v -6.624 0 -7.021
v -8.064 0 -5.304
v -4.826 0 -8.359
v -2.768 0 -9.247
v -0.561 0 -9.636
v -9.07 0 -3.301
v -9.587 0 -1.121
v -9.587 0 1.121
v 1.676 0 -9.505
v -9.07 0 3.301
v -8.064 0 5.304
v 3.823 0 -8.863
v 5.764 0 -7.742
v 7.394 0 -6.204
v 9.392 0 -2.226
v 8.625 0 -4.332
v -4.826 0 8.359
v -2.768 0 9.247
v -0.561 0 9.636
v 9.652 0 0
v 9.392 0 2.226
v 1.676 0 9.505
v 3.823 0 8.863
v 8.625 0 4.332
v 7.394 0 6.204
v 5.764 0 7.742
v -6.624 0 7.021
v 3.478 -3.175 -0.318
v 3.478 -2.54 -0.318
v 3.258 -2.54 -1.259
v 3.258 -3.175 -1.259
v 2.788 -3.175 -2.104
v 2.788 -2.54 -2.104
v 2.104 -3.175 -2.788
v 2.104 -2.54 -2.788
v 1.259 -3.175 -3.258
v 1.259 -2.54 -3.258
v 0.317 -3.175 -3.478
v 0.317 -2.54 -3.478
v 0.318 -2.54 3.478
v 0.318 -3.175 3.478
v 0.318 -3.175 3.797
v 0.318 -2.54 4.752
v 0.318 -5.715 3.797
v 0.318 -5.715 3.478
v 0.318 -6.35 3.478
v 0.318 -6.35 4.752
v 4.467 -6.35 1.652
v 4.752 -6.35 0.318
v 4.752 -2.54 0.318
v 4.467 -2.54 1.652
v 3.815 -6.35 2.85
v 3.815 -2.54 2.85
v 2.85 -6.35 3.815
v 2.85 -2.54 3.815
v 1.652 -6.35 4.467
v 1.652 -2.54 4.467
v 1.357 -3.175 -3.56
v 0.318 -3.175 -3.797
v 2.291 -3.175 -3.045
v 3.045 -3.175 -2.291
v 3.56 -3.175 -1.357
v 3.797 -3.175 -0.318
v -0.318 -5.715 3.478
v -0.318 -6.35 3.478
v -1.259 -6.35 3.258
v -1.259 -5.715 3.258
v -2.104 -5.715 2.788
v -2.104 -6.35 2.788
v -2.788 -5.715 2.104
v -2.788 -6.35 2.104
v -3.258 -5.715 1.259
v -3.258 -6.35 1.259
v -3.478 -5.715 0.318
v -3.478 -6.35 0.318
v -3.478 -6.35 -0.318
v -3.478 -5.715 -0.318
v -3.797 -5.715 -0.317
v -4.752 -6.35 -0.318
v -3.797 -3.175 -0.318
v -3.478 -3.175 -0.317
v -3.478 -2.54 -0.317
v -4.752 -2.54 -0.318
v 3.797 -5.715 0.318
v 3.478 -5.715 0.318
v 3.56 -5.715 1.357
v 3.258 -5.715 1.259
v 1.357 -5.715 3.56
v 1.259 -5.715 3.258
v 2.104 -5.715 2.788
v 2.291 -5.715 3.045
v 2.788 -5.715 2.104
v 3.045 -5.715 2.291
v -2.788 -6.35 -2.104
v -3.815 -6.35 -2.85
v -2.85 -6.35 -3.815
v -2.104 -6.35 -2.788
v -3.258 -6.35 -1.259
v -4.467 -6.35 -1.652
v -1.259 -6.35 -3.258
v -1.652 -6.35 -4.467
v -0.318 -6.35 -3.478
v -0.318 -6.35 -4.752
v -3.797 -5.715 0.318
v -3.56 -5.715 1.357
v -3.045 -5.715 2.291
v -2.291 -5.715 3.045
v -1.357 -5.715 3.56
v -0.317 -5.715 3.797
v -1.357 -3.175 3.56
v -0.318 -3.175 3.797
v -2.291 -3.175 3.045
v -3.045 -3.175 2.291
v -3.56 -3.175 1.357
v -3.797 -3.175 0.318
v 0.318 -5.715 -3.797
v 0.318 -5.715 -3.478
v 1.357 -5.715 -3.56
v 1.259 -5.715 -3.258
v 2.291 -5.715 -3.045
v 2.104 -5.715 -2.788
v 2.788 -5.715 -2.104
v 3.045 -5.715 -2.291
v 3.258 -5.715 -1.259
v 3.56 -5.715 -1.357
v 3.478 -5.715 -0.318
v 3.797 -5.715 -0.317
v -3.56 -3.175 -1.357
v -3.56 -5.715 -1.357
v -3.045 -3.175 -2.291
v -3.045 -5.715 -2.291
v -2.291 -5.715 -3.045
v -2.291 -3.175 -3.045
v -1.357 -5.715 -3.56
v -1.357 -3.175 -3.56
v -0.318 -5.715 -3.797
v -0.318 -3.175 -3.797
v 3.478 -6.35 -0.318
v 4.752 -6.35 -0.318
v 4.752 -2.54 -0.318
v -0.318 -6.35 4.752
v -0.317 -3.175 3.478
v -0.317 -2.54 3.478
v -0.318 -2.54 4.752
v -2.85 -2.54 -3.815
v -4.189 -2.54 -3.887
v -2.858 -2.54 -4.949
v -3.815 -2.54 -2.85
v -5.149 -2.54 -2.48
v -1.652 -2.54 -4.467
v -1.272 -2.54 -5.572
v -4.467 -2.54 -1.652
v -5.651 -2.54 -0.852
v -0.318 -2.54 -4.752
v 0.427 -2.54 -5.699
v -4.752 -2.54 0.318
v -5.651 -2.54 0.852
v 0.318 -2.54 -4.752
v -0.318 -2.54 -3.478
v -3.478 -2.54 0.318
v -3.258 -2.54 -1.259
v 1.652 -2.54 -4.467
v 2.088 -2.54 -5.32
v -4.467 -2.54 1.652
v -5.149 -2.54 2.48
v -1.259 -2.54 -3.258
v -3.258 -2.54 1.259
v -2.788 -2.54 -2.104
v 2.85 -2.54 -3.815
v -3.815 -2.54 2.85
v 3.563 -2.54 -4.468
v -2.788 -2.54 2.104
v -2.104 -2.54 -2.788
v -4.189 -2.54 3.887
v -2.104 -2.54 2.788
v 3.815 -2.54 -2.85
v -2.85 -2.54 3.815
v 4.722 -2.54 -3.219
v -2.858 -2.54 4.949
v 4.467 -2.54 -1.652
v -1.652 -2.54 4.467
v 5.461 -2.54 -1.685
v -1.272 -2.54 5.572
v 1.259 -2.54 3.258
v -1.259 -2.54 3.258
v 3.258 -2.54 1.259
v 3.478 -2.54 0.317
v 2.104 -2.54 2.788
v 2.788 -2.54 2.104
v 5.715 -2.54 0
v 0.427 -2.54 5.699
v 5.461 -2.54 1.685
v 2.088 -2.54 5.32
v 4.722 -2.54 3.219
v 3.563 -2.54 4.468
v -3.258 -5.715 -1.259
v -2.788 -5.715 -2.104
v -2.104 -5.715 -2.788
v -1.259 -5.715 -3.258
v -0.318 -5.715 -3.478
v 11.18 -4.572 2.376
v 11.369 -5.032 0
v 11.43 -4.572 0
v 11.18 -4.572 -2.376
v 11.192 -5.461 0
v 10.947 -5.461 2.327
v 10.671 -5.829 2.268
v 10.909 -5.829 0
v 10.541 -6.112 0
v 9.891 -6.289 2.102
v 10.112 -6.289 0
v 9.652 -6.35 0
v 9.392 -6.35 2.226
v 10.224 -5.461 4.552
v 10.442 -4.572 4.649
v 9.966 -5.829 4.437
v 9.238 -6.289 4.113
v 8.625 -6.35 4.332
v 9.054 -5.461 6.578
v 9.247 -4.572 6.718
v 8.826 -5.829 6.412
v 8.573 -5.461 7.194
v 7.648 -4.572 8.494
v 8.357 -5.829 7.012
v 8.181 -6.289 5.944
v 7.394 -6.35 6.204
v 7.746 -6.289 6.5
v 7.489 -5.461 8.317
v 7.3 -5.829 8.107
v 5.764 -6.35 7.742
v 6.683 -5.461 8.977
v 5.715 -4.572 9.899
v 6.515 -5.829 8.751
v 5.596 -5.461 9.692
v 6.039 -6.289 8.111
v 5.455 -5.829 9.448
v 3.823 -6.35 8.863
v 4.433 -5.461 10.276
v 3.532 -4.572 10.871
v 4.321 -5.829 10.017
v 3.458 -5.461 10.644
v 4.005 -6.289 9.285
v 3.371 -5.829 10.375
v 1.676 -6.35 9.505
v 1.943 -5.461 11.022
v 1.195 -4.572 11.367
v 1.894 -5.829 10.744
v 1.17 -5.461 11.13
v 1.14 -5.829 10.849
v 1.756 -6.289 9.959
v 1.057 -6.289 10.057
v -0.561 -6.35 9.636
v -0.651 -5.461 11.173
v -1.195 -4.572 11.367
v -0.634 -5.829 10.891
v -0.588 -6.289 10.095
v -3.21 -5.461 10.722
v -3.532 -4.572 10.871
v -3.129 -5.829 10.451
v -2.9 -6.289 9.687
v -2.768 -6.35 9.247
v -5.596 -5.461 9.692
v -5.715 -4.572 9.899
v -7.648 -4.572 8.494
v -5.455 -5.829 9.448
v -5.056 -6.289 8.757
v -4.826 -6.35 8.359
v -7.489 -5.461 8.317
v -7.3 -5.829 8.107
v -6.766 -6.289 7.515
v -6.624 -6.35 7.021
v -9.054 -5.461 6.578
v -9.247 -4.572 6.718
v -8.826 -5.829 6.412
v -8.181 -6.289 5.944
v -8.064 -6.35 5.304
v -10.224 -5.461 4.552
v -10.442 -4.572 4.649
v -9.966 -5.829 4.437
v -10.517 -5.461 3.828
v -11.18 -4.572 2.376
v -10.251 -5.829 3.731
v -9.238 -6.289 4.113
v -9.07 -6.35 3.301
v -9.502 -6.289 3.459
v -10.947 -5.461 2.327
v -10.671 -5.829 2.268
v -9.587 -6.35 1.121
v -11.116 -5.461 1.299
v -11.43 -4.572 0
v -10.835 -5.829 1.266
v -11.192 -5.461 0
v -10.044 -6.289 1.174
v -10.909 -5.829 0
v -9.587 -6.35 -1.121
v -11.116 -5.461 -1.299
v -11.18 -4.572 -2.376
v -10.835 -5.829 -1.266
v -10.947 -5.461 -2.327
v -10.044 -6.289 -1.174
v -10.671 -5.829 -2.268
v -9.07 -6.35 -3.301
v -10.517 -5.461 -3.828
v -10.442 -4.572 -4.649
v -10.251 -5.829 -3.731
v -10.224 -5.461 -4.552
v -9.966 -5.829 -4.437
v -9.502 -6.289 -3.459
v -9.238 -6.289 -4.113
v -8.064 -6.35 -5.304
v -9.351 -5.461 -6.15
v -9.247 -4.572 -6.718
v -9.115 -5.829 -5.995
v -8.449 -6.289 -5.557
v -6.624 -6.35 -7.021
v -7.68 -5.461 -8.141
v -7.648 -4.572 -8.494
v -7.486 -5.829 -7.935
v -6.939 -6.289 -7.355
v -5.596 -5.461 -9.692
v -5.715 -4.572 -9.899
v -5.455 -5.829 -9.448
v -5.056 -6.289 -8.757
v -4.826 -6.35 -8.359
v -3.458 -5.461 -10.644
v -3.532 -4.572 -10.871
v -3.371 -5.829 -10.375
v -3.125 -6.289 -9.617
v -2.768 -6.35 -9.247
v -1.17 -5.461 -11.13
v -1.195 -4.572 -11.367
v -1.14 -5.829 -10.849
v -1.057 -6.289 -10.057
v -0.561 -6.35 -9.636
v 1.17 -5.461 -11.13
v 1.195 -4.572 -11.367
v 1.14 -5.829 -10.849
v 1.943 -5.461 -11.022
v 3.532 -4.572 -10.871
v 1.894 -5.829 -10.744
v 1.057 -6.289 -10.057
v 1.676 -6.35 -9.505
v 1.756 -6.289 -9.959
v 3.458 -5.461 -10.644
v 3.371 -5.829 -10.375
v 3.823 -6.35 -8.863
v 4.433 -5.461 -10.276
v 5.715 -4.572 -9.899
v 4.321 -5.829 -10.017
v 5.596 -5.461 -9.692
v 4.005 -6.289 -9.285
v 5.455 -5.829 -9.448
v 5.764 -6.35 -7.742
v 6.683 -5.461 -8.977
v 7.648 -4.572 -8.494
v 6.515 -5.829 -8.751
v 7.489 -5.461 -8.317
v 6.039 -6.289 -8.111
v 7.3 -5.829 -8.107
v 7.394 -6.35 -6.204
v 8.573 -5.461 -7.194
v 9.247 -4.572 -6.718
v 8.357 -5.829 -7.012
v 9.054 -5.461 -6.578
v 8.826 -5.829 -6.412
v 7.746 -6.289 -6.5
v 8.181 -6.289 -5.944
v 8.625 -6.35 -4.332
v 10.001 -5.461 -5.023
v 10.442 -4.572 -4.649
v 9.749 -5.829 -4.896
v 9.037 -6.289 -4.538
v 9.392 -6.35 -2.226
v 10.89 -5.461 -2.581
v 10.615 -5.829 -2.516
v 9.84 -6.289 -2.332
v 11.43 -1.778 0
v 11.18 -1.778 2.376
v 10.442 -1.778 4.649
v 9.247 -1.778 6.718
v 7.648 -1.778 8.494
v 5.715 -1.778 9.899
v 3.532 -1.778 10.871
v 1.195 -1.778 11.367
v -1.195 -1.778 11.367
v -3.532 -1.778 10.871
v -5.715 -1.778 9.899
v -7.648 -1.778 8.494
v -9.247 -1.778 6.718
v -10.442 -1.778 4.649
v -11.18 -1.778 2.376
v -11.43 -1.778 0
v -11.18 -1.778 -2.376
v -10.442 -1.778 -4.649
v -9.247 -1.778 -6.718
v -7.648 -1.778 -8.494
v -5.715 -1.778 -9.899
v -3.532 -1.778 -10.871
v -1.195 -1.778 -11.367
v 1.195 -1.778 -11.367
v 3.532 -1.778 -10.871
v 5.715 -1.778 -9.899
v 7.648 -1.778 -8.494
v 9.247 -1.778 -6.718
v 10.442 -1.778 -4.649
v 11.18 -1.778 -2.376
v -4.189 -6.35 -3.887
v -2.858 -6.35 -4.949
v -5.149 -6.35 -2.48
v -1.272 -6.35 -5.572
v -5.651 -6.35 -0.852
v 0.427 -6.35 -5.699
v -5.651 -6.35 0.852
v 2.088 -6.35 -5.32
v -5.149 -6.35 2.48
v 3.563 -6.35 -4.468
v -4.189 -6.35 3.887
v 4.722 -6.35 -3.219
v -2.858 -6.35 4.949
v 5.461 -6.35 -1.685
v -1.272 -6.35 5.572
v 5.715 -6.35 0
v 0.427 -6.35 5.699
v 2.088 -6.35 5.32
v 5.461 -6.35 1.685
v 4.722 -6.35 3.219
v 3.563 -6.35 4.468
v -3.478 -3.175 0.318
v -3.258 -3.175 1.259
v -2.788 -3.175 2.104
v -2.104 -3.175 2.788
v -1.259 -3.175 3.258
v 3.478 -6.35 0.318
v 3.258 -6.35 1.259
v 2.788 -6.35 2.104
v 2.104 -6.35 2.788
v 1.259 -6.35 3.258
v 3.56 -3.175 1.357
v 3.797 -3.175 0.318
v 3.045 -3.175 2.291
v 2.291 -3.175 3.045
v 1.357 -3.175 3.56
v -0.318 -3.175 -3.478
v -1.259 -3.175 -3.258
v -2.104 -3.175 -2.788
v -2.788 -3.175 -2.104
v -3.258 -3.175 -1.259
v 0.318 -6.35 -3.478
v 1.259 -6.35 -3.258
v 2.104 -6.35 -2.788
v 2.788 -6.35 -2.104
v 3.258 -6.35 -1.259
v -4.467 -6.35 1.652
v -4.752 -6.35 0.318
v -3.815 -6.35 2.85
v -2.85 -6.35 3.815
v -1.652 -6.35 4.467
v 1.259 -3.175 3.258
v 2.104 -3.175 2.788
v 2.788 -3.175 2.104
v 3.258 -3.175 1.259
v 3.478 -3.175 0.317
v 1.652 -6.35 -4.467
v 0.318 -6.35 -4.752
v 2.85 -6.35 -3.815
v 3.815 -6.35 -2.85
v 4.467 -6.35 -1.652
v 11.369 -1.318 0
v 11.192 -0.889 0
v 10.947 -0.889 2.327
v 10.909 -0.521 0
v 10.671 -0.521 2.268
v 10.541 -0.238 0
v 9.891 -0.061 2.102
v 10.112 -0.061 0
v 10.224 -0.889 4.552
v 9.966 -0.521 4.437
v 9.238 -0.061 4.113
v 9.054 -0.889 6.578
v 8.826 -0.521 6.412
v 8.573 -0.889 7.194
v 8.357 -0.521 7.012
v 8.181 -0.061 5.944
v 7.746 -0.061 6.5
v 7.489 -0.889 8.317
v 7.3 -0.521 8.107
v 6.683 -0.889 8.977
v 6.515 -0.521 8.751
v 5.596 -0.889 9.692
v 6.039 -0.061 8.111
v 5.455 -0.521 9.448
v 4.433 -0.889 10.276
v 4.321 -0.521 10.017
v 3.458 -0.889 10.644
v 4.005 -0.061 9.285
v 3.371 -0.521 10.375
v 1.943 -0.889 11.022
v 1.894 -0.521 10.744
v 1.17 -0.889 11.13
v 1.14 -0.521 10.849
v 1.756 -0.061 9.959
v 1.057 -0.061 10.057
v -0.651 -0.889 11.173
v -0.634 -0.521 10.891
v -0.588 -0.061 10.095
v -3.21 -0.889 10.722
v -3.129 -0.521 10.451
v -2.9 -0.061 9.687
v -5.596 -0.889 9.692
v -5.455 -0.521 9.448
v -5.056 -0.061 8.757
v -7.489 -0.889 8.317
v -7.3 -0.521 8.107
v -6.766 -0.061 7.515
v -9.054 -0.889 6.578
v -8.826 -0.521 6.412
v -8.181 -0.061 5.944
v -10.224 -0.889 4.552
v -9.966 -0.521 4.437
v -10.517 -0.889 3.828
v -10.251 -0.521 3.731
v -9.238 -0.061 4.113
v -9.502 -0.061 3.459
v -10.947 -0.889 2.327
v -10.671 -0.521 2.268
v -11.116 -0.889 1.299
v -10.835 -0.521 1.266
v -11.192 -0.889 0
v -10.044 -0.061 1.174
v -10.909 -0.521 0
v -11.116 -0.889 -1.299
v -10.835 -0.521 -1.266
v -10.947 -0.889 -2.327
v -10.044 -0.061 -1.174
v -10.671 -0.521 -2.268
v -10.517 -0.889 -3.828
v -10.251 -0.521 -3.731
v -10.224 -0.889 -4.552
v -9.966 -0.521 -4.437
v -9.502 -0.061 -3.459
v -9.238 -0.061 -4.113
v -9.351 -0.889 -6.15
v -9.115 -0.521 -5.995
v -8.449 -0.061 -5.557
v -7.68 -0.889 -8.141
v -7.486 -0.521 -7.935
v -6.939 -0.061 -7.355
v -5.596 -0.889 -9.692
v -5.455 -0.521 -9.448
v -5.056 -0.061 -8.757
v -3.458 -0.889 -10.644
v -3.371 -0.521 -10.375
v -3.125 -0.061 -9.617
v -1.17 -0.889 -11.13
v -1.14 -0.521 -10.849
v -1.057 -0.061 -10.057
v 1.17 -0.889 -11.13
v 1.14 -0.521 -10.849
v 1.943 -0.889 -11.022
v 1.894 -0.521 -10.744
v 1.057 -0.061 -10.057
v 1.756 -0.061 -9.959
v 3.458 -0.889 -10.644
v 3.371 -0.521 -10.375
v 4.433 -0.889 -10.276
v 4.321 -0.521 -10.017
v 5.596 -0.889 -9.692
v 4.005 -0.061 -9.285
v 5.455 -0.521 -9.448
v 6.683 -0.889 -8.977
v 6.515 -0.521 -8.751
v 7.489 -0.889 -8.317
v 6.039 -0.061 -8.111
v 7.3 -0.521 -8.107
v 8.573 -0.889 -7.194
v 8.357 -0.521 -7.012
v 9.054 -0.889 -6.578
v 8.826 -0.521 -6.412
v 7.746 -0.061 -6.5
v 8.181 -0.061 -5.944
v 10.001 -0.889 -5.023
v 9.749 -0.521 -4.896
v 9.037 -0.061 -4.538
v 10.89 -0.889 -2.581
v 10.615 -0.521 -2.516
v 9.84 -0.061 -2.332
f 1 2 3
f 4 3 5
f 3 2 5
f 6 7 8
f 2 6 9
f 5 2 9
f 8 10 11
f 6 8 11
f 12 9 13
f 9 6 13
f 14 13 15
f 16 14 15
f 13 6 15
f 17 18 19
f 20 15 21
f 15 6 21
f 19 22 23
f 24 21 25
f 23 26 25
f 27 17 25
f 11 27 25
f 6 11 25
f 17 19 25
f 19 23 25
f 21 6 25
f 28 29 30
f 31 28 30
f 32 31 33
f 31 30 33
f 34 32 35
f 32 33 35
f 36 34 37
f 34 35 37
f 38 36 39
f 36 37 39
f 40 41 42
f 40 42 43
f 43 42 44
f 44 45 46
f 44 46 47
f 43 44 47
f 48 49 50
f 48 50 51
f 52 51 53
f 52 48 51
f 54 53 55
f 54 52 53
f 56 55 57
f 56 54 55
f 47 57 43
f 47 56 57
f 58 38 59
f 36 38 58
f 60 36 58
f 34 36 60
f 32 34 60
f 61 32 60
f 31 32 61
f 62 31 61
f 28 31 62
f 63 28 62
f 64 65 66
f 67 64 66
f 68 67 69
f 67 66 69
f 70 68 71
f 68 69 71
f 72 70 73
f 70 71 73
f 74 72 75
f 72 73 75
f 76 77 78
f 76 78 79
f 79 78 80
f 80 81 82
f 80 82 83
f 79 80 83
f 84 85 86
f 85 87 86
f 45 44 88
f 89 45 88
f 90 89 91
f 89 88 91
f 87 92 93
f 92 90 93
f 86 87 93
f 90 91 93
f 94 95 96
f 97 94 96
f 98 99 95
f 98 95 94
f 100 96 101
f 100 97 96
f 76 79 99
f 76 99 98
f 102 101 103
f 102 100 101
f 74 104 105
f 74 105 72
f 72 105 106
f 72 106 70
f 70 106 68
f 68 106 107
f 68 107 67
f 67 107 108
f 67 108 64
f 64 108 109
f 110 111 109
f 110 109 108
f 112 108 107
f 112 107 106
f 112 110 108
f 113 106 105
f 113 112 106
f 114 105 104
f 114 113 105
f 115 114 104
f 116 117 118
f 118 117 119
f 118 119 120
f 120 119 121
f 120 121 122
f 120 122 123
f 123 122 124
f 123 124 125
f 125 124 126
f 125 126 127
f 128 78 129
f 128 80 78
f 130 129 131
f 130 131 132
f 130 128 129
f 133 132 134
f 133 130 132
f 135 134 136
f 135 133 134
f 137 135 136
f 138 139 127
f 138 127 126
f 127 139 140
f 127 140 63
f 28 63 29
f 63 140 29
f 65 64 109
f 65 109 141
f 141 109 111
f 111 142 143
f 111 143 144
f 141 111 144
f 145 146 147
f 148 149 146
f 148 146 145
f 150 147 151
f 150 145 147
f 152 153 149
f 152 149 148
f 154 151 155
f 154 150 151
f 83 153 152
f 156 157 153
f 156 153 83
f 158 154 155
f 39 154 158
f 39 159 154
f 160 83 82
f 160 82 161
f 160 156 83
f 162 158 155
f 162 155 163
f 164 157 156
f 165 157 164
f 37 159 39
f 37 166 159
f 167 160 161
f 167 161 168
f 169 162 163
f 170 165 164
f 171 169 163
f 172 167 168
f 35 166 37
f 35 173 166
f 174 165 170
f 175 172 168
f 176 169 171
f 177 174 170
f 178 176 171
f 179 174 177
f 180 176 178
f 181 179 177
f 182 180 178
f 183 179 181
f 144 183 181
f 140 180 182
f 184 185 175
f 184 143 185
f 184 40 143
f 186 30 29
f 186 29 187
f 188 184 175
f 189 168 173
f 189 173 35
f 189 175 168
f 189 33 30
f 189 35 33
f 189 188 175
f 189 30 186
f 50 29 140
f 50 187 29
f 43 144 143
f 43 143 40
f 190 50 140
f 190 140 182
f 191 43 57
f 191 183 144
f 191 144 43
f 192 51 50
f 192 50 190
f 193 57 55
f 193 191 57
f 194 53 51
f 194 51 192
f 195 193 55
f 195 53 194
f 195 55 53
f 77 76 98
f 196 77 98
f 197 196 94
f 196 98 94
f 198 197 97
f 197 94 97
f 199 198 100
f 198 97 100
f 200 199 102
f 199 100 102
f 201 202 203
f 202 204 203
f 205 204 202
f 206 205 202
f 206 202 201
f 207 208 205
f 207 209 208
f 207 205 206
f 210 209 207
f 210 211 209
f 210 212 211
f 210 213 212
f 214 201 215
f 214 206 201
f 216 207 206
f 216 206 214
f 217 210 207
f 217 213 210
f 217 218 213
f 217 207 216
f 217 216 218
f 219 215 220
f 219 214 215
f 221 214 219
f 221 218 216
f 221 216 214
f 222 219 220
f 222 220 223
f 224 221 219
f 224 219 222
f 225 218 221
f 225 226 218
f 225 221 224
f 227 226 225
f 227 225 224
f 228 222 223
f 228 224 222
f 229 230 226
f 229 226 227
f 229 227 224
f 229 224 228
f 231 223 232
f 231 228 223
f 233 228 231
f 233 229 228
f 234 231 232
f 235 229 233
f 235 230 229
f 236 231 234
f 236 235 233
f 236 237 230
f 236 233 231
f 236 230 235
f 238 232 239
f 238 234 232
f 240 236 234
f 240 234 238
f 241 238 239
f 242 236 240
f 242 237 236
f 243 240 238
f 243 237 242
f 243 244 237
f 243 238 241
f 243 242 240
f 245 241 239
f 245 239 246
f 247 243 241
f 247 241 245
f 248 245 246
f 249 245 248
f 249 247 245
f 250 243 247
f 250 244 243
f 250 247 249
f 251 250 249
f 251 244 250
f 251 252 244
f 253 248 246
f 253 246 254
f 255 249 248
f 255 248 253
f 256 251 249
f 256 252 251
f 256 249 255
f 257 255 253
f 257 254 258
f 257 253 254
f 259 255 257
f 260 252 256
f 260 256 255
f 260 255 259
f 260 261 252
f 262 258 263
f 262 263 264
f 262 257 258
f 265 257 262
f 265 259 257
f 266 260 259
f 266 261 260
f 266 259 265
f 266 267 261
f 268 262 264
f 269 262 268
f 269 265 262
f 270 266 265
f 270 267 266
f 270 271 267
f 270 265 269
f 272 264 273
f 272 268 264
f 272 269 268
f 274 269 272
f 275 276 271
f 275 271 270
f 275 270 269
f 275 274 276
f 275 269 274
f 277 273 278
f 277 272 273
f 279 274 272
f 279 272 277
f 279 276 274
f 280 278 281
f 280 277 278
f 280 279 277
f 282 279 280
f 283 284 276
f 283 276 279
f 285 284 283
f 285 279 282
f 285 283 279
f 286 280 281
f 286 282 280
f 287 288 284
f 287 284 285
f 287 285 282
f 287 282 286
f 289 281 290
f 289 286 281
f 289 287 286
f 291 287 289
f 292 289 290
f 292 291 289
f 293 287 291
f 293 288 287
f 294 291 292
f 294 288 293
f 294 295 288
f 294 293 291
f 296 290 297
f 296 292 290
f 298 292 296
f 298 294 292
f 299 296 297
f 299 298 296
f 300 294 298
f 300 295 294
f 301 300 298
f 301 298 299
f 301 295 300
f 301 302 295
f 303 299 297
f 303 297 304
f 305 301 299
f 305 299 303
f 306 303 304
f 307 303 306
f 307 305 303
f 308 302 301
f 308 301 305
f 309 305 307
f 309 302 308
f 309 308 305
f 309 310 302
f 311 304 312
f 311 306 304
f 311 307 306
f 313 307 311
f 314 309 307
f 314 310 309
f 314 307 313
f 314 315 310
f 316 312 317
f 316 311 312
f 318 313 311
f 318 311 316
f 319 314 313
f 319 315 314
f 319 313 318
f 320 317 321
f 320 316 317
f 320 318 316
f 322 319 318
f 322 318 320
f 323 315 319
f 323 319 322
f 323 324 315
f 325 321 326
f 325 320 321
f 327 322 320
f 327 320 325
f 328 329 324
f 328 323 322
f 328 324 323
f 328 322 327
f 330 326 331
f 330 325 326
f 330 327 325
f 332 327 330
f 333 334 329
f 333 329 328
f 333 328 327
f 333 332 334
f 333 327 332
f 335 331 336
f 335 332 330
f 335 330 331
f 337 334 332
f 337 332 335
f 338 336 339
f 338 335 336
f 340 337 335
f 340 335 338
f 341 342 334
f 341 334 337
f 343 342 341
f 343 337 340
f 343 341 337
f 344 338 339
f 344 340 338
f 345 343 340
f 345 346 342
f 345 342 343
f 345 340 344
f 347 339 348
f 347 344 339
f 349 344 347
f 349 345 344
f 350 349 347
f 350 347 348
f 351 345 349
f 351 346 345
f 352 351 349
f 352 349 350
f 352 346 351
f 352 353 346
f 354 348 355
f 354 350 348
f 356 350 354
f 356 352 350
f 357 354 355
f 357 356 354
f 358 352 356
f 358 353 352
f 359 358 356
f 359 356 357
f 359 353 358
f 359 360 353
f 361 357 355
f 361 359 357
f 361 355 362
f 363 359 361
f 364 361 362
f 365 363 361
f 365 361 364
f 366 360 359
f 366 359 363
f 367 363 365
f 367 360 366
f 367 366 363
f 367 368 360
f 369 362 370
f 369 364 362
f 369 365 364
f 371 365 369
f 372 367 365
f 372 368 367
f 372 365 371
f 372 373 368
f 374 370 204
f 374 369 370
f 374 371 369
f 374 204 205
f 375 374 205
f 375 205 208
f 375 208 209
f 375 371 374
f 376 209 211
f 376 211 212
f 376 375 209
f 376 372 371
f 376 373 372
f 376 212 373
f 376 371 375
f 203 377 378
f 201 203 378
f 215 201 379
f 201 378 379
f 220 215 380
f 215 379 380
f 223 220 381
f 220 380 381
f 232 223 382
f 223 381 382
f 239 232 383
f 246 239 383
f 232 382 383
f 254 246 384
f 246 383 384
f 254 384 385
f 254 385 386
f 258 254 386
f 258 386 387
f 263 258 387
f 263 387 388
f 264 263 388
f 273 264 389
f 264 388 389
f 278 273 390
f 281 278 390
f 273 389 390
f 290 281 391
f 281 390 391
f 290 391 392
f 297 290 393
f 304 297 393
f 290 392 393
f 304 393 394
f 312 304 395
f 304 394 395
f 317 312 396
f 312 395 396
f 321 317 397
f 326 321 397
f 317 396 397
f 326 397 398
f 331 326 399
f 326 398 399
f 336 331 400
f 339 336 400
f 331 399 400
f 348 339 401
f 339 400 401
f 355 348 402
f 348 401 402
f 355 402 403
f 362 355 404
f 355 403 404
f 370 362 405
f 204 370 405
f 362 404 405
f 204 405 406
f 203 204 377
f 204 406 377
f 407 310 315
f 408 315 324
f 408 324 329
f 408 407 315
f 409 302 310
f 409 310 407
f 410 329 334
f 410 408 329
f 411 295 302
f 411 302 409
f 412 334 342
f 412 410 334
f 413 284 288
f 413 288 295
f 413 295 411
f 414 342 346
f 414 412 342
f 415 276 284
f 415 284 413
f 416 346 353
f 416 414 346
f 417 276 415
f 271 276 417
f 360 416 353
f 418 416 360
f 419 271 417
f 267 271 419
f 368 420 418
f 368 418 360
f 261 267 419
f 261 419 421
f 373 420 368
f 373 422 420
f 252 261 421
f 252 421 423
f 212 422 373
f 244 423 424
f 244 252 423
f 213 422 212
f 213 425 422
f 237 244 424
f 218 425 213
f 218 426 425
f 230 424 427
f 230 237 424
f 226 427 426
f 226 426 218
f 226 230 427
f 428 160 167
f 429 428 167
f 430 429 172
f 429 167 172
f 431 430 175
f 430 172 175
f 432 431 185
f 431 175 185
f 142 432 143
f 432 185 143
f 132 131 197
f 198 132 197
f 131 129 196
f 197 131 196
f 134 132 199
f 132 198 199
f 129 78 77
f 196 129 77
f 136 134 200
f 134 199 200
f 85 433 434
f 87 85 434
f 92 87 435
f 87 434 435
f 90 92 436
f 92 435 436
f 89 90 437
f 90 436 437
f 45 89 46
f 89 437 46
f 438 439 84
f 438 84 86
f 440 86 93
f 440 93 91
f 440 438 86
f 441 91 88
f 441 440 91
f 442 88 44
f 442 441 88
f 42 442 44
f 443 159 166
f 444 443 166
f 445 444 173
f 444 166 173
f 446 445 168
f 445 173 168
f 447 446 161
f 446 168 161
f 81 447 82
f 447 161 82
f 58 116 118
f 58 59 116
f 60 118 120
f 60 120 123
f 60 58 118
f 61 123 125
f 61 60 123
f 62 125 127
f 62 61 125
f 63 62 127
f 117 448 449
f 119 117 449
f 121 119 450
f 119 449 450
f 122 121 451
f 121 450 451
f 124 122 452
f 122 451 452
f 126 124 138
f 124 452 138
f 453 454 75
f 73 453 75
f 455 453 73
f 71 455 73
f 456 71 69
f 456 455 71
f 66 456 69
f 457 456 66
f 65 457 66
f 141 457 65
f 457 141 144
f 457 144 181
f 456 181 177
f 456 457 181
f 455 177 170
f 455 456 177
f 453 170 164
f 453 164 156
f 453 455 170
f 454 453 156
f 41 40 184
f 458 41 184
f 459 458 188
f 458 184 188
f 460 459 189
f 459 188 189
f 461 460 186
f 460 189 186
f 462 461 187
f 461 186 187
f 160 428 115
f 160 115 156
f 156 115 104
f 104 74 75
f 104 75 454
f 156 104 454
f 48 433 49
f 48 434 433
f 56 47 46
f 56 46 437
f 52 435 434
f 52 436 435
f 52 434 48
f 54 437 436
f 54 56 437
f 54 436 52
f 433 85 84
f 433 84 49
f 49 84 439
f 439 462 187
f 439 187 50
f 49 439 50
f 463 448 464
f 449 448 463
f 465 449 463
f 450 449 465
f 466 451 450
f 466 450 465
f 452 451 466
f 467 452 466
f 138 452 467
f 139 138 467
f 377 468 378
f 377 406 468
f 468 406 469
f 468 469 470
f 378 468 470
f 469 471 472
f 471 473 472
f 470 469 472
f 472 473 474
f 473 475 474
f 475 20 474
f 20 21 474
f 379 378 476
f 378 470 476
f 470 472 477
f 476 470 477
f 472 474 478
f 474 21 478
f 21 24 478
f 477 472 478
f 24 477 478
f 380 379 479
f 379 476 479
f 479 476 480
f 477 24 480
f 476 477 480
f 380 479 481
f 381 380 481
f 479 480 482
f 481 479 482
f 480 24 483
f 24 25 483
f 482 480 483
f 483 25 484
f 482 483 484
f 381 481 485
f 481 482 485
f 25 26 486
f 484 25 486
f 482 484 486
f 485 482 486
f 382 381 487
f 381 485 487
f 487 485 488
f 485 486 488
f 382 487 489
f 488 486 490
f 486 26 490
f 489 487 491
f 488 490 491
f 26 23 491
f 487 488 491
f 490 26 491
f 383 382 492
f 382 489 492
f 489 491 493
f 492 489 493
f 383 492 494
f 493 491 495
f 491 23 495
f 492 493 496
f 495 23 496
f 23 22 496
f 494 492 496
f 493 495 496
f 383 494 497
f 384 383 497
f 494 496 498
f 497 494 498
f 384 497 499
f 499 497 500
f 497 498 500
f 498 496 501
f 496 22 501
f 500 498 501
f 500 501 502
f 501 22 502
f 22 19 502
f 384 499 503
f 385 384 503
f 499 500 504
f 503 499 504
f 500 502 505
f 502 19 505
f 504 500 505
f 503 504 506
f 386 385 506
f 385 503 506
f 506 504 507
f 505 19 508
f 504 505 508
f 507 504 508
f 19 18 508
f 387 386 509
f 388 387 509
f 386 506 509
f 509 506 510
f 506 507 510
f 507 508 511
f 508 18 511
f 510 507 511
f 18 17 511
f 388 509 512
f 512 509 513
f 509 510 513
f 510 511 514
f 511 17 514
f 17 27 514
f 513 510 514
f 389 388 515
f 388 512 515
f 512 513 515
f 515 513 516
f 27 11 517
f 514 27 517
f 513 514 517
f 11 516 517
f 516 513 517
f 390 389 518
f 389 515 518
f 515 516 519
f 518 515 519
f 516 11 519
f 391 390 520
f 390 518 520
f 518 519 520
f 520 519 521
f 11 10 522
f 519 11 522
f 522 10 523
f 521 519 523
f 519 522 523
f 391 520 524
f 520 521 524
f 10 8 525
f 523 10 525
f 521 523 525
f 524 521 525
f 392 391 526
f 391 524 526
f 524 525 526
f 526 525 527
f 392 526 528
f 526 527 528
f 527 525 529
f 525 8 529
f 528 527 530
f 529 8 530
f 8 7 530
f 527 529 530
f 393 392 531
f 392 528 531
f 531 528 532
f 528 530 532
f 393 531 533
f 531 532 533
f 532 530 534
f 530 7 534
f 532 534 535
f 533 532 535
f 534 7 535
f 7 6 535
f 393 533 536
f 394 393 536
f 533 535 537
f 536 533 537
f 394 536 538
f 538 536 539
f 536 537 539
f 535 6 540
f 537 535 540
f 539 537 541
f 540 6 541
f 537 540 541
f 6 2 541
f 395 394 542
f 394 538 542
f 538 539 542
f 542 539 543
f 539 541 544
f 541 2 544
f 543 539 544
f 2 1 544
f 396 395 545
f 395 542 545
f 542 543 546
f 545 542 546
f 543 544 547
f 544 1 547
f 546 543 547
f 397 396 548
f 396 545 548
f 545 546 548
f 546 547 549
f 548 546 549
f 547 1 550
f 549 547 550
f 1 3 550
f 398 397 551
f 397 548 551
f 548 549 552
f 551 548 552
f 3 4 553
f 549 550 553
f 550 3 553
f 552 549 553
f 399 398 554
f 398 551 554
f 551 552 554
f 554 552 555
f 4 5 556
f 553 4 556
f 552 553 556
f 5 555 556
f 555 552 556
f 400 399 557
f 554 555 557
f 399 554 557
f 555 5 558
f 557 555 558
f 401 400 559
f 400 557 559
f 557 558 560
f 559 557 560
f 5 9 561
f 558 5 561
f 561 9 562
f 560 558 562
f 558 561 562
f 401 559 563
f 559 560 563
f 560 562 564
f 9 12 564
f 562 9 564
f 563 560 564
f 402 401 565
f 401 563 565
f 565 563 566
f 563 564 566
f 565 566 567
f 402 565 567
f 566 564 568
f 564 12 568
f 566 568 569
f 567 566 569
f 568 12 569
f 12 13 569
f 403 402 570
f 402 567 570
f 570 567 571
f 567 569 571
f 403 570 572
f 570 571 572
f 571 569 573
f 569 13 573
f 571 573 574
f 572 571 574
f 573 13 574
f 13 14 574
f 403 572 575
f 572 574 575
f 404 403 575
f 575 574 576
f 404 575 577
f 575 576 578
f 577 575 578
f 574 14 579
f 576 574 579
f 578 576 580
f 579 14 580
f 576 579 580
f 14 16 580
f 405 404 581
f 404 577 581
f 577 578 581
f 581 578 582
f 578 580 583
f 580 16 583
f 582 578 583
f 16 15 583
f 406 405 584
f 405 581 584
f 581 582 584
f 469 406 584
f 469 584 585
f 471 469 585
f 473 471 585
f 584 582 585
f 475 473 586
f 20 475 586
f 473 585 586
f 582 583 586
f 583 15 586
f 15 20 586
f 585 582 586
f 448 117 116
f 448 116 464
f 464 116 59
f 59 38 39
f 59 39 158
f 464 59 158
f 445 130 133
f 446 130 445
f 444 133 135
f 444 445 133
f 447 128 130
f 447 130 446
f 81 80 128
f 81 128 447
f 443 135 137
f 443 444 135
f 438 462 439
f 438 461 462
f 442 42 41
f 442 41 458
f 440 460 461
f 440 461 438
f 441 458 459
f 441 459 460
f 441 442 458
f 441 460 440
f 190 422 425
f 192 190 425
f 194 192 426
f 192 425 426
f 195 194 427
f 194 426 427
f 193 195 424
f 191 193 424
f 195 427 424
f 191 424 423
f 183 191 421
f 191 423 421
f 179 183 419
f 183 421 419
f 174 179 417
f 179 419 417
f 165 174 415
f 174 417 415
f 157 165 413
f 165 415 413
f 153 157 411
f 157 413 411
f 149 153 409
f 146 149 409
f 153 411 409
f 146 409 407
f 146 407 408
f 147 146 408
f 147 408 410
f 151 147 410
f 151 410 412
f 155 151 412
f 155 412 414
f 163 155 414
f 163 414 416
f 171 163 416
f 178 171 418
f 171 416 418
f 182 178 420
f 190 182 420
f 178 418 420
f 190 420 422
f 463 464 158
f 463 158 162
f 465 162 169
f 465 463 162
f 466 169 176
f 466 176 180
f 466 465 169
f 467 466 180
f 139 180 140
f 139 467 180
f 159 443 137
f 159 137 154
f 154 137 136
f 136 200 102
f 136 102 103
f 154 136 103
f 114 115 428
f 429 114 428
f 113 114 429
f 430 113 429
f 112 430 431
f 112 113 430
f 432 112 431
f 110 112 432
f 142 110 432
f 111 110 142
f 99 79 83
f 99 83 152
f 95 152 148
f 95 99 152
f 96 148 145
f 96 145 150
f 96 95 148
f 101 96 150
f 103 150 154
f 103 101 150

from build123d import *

# Parameters (mm, degrees)
F0_R      = 11.43
F1_DEPTH  = 6.35
F2_R      = 3.4925
F3_DEPTH  = 3.81
F4_R      = 5.715
F4_R_2    = 4.7625
F5_DEPTH  = 3.81
F7_DEPTH  = 3.81
F8_R      = 3.81
F9_DEPTH  = 3.175
F10_R     = 1.778
F11_DEPTH = 0.635


with BuildPart() as f1:
    # F0 (on Front) → F1 (new body)
    with BuildSketch(Plane.XZ):
        Circle(F0_R)
    extrude(amount=F1_DEPTH)

    # F2 (on face) → F3 (cut)
    with BuildSketch(Plane.XZ.offset(6.35)):
        Circle(F2_R)
    extrude(amount=-F3_DEPTH, mode=Mode.SUBTRACT)

    # F4 (on face) → F5 (cut)
    with BuildSketch(Plane.XZ.offset(6.35)):
        Circle(F4_R)
        Circle(F4_R_2, mode=Mode.SUBTRACT)
    extrude(amount=-F5_DEPTH, mode=Mode.SUBTRACT)

    # F6 (on face) → F7 (cut)
    with BuildSketch(Plane.XZ.offset(6.35)):
        with BuildLine():
            Line((0.3175, 3.4780382402), (0.3175, 4.4336462139))
            ThreePointArc((0.3175, 4.4336462139), (0, 4.445), (-0.3175, 4.4336462139))
            Line((-0.3175, 4.4336462139), (-0.3175, 3.4780382402))
            ThreePointArc((-0.3175, 3.4780382402), (0, 3.4925), (0.3175, 3.4780382402))
        make_face()
        with BuildLine():
            Line((-3.4780382402, 0.3175), (-4.4336462139, 0.3175))
            ThreePointArc((-4.4336462139, 0.3175), (-4.445, 0), (-4.4336462139, -0.3175))
            Line((-4.4336462139, -0.3175), (-3.4780382402, -0.3175))
            ThreePointArc((-3.4780382402, -0.3175), (-3.4925, 0), (-3.4780382402, 0.3175))
        make_face()
        with BuildLine():
            ThreePointArc((4.4336462139, -0.3175), (4.4421606466, -0.1588514703), (4.445, 0))
            ThreePointArc((4.445, 0), (4.4421606466, 0.1588514703), (4.4336462139, 0.3175))
            Line((4.4336462139, 0.3175), (3.4780382402, 0.3175))
            ThreePointArc((3.4780382402, 0.3175), (3.4888826867, 0.1589145938), (3.4925, 0))
            ThreePointArc((3.4925, 0), (3.4888826867, -0.1589145938), (3.4780382402, -0.3175))
            Line((3.4780382402, -0.3175), (4.4336462139, -0.3175))
        make_face()
        with BuildLine():
            ThreePointArc((-0.3175, -4.4336462139), (0, -4.445), (0.3175, -4.4336462139))
            Line((0.3175, -4.4336462139), (0.3175, -3.4780382402))
            ThreePointArc((0.3175, -3.4780382402), (0, -3.4925), (-0.3175, -3.4780382402))
            Line((-0.3175, -3.4780382402), (-0.3175, -4.4336462139))
        make_face()
        with BuildLine():
            ThreePointArc((-0.3175, 4.4336462139), (0, 4.445), (0.3175, 4.4336462139))
            Line((0.3175, 4.4336462139), (0.3175, 4.7519048812))
            ThreePointArc((0.3175, 4.7519048812), (0.1588383664, 4.7598504833), (0, 4.7625))
            ThreePointArc((0, 4.7625), (-0.1588383664, 4.7598504833), (-0.3175, 4.7519048812))
            Line((-0.3175, 4.7519048812), (-0.3175, 4.4336462139))
        make_face()
        with BuildLine():
            ThreePointArc((-4.4336462139, -0.3175), (-4.445, 0), (-4.4336462139, 0.3175))
            Line((-4.4336462139, 0.3175), (-4.7519048812, 0.3175))
            ThreePointArc((-4.7519048812, 0.3175), (-4.7598504833, 0.1588383664), (-4.7625, 0))
            ThreePointArc((-4.7625, 0), (-4.7598504833, -0.1588383664), (-4.7519048812, -0.3175))
            Line((-4.7519048812, -0.3175), (-4.4336462139, -0.3175))
        make_face()
        with BuildLine():
            ThreePointArc((4.4336462139, 0.3175), (4.4421606466, 0.1588514703), (4.445, 0))
            ThreePointArc((4.445, 0), (4.4421606466, -0.1588514703), (4.4336462139, -0.3175))
            Line((4.4336462139, -0.3175), (4.7519048812, -0.3175))
            ThreePointArc((4.7519048812, -0.3175), (4.7598504833, -0.1588383664), (4.7625, 0))
            ThreePointArc((4.7625, 0), (4.7598504833, 0.1588383664), (4.7519048812, 0.3175))
            Line((4.7519048812, 0.3175), (4.4336462139, 0.3175))
        make_face()
        with BuildLine():
            Line((0.3175, -4.7519048812), (0.3175, -4.4336462139))
            ThreePointArc((0.3175, -4.4336462139), (0, -4.445), (-0.3175, -4.4336462139))
            Line((-0.3175, -4.4336462139), (-0.3175, -4.7519048812))
            ThreePointArc((-0.3175, -4.7519048812), (-0.1588383664, -4.7598504833), (0, -4.7625))
            ThreePointArc((0, -4.7625), (0.1588383664, -4.7598504833), (0.3175, -4.7519048812))
        make_face()
    extrude(amount=-F7_DEPTH, mode=Mode.SUBTRACT)

    # F8 (on face) → F9 (cut)
    with BuildSketch(Plane.XZ.offset(2.54)):
        Circle(F8_R)
    extrude(amount=F9_DEPTH, mode=Mode.SUBTRACT)

    # F10
    f10_edges = [f1.edges().sort_by_distance(p)[0] for p in [
        (-11.43, -6.35, 0),
        (-11.43, 0, 0),
    ]]
    fillet(f10_edges, radius=F10_R)

    # F8 (on face) → F11 (join)
    with BuildSketch(Plane.XZ.offset(2.54)):
        with BuildLine():
            ThreePointArc((0.3175, -3.7967477859), (2.6940768363, -2.6940768363), (3.7967477859, -0.3175))
            Line((3.7967477859, -0.3175), (3.4780382402, -0.3175))
            ThreePointArc((3.4780382402, -0.3175), (2.4695704333, -2.4695704333), (0.3175, -3.4780382402))
            Line((0.3175, -3.4780382402), (0.3175, -3.7967477859))
        make_face()
        with BuildLine():
            Line((3.4780382402, 0.3175), (3.7967477859, 0.3175))
            ThreePointArc((3.7967477859, 0.3175), (2.6940768363, 2.6940768363), (0.3175, 3.7967477859))
            Line((0.3175, 3.7967477859), (0.3175, 3.4780382402))
            ThreePointArc((0.3175, 3.4780382402), (2.4695704333, 2.4695704333), (3.4780382402, 0.3175))
        make_face()
        with BuildLine():
            Line((-0.3175, 3.4780382402), (-0.3175, 3.7967477859))
            ThreePointArc((-0.3175, 3.7967477859), (-2.6940768363, 2.6940768363), (-3.7967477859, 0.3175))
            Line((-3.7967477859, 0.3175), (-3.4780382402, 0.3175))
            ThreePointArc((-3.4780382402, 0.3175), (-2.4695704333, 2.4695704333), (-0.3175, 3.4780382402))
        make_face()
        with BuildLine():
            ThreePointArc((-3.7967477859, -0.3175), (-2.6940768363, -2.6940768363), (-0.3175, -3.7967477859))
            Line((-0.3175, -3.7967477859), (-0.3175, -3.4780382402))
            ThreePointArc((-0.3175, -3.4780382402), (-2.4695704333, -2.4695704333), (-3.4780382402, -0.3175))
            Line((-3.4780382402, -0.3175), (-3.7967477859, -0.3175))
        make_face()
    extrude(amount=F11_DEPTH)


solid = f1.part
